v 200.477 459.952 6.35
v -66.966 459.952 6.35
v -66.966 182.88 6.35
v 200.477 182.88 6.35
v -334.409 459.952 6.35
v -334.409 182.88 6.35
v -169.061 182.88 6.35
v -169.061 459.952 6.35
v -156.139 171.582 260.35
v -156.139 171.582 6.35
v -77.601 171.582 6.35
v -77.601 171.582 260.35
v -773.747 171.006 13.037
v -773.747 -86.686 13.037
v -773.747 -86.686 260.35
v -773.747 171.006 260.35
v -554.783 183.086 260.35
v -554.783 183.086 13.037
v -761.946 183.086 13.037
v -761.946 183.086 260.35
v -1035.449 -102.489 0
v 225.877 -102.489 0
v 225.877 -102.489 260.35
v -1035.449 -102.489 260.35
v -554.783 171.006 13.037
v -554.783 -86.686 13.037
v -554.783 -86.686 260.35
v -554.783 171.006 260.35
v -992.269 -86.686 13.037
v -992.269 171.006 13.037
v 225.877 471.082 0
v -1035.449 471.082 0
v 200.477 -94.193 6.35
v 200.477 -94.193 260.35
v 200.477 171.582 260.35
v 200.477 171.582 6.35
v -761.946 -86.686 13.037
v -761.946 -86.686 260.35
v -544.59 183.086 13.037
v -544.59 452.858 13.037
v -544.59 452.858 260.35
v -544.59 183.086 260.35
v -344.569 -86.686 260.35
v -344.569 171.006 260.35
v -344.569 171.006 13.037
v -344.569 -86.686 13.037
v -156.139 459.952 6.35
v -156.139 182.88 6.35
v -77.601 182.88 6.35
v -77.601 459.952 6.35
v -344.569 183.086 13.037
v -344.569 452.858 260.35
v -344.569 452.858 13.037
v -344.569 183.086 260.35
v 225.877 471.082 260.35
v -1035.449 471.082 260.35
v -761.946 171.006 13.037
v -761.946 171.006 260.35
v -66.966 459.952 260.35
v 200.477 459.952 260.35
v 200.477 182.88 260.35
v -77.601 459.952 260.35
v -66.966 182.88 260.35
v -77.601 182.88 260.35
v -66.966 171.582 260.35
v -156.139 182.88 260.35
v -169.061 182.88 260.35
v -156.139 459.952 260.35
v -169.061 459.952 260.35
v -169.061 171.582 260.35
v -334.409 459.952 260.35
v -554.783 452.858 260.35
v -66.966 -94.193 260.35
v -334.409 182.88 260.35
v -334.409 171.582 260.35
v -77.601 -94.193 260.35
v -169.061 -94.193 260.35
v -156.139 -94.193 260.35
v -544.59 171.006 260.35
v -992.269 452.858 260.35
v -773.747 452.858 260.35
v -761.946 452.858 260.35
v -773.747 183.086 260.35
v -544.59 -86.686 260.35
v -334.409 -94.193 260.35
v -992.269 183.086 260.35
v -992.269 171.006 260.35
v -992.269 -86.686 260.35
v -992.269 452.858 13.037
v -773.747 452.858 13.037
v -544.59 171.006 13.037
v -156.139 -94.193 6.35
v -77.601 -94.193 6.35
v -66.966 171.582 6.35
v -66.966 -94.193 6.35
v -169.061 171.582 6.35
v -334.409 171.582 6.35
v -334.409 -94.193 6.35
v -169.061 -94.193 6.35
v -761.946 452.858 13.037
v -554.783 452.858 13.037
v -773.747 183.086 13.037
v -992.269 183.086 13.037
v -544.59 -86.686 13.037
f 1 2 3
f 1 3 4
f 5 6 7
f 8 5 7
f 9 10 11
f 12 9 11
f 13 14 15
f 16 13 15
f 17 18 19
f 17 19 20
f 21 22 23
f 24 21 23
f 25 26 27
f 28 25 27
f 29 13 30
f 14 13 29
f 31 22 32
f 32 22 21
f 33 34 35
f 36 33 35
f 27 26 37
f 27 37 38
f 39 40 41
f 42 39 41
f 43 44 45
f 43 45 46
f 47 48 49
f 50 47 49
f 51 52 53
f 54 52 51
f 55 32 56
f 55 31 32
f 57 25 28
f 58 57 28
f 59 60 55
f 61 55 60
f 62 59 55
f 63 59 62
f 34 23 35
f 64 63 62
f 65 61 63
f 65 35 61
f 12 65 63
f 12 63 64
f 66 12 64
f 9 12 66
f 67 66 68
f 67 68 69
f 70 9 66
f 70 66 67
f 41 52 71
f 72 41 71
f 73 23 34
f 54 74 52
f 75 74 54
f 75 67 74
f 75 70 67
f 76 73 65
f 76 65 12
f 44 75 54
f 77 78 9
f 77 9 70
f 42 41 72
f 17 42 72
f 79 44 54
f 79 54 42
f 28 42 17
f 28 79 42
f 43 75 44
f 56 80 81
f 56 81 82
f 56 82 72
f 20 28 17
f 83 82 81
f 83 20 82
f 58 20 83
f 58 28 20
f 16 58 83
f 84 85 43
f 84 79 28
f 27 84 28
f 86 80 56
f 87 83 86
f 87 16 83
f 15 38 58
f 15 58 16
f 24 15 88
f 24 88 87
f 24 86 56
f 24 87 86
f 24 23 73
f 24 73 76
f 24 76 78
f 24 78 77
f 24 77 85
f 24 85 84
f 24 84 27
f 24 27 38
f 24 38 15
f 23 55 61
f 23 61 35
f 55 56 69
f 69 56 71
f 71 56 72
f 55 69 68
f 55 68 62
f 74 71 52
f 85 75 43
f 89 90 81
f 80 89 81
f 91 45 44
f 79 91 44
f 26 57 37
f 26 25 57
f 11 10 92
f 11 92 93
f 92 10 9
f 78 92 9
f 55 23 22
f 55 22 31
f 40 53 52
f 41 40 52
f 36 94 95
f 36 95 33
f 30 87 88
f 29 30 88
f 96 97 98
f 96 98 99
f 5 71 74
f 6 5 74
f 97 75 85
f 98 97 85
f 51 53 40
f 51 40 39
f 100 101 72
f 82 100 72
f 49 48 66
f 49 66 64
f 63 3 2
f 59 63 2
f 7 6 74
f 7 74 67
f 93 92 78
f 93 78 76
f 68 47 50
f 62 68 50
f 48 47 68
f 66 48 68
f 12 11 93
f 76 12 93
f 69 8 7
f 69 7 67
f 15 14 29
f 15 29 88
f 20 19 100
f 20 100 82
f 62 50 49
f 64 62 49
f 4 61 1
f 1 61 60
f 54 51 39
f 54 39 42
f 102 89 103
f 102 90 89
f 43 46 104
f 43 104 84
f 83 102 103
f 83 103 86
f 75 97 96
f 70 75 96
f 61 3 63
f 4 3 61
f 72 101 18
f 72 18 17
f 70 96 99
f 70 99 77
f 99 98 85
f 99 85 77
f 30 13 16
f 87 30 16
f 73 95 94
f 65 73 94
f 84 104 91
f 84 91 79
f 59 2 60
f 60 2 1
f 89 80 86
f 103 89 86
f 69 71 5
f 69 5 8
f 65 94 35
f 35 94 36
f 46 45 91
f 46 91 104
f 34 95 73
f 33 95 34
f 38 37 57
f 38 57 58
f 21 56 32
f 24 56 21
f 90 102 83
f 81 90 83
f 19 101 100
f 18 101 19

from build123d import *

# Parameters (mm, degrees)
F0_W      = 534.8856896162
F0_H      = 573.5703483224
F1_DEPTH  = 6.35
F2_W      = 534.8856896162
F2_H      = 8.2960128784
F3_DEPTH  = 254
F4_W      = 534.8856896162
F4_H      = 11.1295878887
F5_DEPTH  = 254
F6_W      = 534.8856896162
F6_H      = 11.2980566919
F7_DEPTH  = 254
F8_W      = 10.6345191598
F8_H      = 555.1736503839
F8_H_2    = 277.0723737776
F9_DEPTH  = 254
F10_W     = 573.5703483224
F10_H     = 260.35
F11_DEPTH = 25.4
F12_W     = 12.9221528769
F12_H     = 254
F13_DEPTH = 558.8
F14_W     = 573.5703483224
F14_H     = 260.35
F15_DEPTH = 10.16
F16_W     = 15.8027634025
F16_H     = 260.35
F17_DEPTH = 690.88
F18_W     = 18.2235240936
F18_H     = 260.35
F19_DEPTH = 690.88
F20_W     = 12.0796486735
F20_H     = 260.35
F21_DEPTH = 690.88
F22_W     = 10.1929306984
F22_H     = 260.35
F23_DEPTH = 553.72
F24_W     = 11.8005871773
F24_H     = 260.35
F25_DEPTH = 551.18
F26_W     = 571.6413035989
F26_H     = 260.35
F27_DEPTH = 43.18
F28_W     = 547.8762835264
F28_H     = 13.0373798311
F29_DEPTH = 688.34


with BuildPart() as f1:
    # F0 (on Top) → F1 (new body)
    with BuildSketch(Plane.XY):
        with Locations((-66.9661834836, 184.2964999378)):
            Rectangle(F0_W, F0_H)
    extrude(amount=F1_DEPTH)

    # F2 (on face) → F3 (join)
    with BuildSketch(Plane.XY.offset(6.35)):
        with Locations((-66.9661834836, -98.3406677842)):
            Rectangle(F2_W, F2_H)
    extrude(amount=F3_DEPTH)

    # F4 (on face) → F5 (join)
    with BuildSketch(Plane.XY.offset(6.35)):
        with Locations((-66.9661834836, 465.5168801546)):
            Rectangle(F4_W, F4_H)
    extrude(amount=F5_DEPTH)

    # F6 (on face) → F7 (join)
    with BuildSketch(Plane.XY.offset(6.35)):
        with Locations((-66.9661834836, 177.2306840867)):
            Rectangle(F6_W, F6_H)
    extrude(amount=F7_DEPTH)

    # F8 (on face) → F9 (join)
    with BuildSketch(Plane.XY.offset(6.35)):
        with Locations((-72.2834430635, 182.3652610183)):
            Rectangle(F8_W, F8_H)
        with Locations((-72.2834430635, 321.4158993214)):
            Rectangle(F8_W, F8_H_2)
    extrude(amount=F9_DEPTH)

    # F10 (on face) → F11 (join)
    with BuildSketch(Plane.YZ.offset(200.4766613245)):
        with Locations((184.2964999378, 130.175)):
            Rectangle(F10_W, F10_H)
    extrude(amount=F11_DEPTH)

    # F12 (on face) → F13 (join)
    with BuildSketch(Plane.XZ.offset(-459.9520862103)):
        with Locations((-162.5997051597, 133.35)):
            Rectangle(F12_W, F12_H)
    extrude(amount=F13_DEPTH)

    # F14 (on face) → F15 (join)
    with BuildSketch(Plane(origin=(-334.4090282917, 0, 0), x_dir=(0, -1, 0), z_dir=(-1, 0, 0))):
        with Locations((-184.2964999378, 130.175)):
            Rectangle(F14_W, F14_H)
    extrude(amount=F15_DEPTH)

    # F16 (on face) → F17 (join)
    with BuildSketch(Plane(origin=(-344.5690282917, 0, 0), x_dir=(0, -1, 0), z_dir=(-1, 0, 0))):
        with Locations((94.5872925222, 130.175)):
            Rectangle(F16_W, F16_H)
    extrude(amount=F17_DEPTH)

    # F18 (on face) → F19 (join)
    with BuildSketch(Plane(origin=(-344.5690282917, 0, 0), x_dir=(0, -1, 0), z_dir=(-1, 0, 0))):
        with Locations((-461.9699120522, 130.175)):
            Rectangle(F18_W, F18_H)
    extrude(amount=F19_DEPTH)

    # F20 (on face) → F21 (join)
    with BuildSketch(Plane(origin=(-344.5690282917, 0, 0), x_dir=(0, -1, 0), z_dir=(-1, 0, 0))):
        with Locations((-177.0462952554, 130.175)):
            Rectangle(F20_W, F20_H)
    extrude(amount=F21_DEPTH)

    # F22 (on face) → F23 (join)
    with BuildSketch(Plane.XZ.offset(-452.8581500053)):
        with Locations((-549.6869385242, 130.175)):
            Rectangle(F22_W, F22_H)
    extrude(amount=F23_DEPTH)

    # F24 (on face) → F25 (join)
    with BuildSketch(Plane(origin=(0, -86.685910821, 0), x_dir=(-1, 0, 0), z_dir=(0, 1, 0))):
        with Locations((767.846673727, 130.175)):
            Rectangle(F24_W, F24_H)
    extrude(amount=F25_DEPTH)

    # F26 (on face) → F27 (join)
    with BuildSketch(Plane(origin=(-1035.4490282917, 0, 0), x_dir=(0, -1, 0), z_dir=(-1, 0, 0))):
        with Locations((-183.331977576, 130.175)):
            Rectangle(F26_W, F26_H)
    extrude(amount=-F27_DEPTH)

    # F28 (on face) → F29 (join)
    with BuildSketch(Plane(origin=(-344.5690282917, 0, 0), x_dir=(0, -1, 0), z_dir=(-1, 0, 0))):
        with Locations((-187.2522309422, 6.5186899155)):
            Rectangle(F28_W, F28_H)
    extrude(amount=F29_DEPTH)


solid = f1.part
